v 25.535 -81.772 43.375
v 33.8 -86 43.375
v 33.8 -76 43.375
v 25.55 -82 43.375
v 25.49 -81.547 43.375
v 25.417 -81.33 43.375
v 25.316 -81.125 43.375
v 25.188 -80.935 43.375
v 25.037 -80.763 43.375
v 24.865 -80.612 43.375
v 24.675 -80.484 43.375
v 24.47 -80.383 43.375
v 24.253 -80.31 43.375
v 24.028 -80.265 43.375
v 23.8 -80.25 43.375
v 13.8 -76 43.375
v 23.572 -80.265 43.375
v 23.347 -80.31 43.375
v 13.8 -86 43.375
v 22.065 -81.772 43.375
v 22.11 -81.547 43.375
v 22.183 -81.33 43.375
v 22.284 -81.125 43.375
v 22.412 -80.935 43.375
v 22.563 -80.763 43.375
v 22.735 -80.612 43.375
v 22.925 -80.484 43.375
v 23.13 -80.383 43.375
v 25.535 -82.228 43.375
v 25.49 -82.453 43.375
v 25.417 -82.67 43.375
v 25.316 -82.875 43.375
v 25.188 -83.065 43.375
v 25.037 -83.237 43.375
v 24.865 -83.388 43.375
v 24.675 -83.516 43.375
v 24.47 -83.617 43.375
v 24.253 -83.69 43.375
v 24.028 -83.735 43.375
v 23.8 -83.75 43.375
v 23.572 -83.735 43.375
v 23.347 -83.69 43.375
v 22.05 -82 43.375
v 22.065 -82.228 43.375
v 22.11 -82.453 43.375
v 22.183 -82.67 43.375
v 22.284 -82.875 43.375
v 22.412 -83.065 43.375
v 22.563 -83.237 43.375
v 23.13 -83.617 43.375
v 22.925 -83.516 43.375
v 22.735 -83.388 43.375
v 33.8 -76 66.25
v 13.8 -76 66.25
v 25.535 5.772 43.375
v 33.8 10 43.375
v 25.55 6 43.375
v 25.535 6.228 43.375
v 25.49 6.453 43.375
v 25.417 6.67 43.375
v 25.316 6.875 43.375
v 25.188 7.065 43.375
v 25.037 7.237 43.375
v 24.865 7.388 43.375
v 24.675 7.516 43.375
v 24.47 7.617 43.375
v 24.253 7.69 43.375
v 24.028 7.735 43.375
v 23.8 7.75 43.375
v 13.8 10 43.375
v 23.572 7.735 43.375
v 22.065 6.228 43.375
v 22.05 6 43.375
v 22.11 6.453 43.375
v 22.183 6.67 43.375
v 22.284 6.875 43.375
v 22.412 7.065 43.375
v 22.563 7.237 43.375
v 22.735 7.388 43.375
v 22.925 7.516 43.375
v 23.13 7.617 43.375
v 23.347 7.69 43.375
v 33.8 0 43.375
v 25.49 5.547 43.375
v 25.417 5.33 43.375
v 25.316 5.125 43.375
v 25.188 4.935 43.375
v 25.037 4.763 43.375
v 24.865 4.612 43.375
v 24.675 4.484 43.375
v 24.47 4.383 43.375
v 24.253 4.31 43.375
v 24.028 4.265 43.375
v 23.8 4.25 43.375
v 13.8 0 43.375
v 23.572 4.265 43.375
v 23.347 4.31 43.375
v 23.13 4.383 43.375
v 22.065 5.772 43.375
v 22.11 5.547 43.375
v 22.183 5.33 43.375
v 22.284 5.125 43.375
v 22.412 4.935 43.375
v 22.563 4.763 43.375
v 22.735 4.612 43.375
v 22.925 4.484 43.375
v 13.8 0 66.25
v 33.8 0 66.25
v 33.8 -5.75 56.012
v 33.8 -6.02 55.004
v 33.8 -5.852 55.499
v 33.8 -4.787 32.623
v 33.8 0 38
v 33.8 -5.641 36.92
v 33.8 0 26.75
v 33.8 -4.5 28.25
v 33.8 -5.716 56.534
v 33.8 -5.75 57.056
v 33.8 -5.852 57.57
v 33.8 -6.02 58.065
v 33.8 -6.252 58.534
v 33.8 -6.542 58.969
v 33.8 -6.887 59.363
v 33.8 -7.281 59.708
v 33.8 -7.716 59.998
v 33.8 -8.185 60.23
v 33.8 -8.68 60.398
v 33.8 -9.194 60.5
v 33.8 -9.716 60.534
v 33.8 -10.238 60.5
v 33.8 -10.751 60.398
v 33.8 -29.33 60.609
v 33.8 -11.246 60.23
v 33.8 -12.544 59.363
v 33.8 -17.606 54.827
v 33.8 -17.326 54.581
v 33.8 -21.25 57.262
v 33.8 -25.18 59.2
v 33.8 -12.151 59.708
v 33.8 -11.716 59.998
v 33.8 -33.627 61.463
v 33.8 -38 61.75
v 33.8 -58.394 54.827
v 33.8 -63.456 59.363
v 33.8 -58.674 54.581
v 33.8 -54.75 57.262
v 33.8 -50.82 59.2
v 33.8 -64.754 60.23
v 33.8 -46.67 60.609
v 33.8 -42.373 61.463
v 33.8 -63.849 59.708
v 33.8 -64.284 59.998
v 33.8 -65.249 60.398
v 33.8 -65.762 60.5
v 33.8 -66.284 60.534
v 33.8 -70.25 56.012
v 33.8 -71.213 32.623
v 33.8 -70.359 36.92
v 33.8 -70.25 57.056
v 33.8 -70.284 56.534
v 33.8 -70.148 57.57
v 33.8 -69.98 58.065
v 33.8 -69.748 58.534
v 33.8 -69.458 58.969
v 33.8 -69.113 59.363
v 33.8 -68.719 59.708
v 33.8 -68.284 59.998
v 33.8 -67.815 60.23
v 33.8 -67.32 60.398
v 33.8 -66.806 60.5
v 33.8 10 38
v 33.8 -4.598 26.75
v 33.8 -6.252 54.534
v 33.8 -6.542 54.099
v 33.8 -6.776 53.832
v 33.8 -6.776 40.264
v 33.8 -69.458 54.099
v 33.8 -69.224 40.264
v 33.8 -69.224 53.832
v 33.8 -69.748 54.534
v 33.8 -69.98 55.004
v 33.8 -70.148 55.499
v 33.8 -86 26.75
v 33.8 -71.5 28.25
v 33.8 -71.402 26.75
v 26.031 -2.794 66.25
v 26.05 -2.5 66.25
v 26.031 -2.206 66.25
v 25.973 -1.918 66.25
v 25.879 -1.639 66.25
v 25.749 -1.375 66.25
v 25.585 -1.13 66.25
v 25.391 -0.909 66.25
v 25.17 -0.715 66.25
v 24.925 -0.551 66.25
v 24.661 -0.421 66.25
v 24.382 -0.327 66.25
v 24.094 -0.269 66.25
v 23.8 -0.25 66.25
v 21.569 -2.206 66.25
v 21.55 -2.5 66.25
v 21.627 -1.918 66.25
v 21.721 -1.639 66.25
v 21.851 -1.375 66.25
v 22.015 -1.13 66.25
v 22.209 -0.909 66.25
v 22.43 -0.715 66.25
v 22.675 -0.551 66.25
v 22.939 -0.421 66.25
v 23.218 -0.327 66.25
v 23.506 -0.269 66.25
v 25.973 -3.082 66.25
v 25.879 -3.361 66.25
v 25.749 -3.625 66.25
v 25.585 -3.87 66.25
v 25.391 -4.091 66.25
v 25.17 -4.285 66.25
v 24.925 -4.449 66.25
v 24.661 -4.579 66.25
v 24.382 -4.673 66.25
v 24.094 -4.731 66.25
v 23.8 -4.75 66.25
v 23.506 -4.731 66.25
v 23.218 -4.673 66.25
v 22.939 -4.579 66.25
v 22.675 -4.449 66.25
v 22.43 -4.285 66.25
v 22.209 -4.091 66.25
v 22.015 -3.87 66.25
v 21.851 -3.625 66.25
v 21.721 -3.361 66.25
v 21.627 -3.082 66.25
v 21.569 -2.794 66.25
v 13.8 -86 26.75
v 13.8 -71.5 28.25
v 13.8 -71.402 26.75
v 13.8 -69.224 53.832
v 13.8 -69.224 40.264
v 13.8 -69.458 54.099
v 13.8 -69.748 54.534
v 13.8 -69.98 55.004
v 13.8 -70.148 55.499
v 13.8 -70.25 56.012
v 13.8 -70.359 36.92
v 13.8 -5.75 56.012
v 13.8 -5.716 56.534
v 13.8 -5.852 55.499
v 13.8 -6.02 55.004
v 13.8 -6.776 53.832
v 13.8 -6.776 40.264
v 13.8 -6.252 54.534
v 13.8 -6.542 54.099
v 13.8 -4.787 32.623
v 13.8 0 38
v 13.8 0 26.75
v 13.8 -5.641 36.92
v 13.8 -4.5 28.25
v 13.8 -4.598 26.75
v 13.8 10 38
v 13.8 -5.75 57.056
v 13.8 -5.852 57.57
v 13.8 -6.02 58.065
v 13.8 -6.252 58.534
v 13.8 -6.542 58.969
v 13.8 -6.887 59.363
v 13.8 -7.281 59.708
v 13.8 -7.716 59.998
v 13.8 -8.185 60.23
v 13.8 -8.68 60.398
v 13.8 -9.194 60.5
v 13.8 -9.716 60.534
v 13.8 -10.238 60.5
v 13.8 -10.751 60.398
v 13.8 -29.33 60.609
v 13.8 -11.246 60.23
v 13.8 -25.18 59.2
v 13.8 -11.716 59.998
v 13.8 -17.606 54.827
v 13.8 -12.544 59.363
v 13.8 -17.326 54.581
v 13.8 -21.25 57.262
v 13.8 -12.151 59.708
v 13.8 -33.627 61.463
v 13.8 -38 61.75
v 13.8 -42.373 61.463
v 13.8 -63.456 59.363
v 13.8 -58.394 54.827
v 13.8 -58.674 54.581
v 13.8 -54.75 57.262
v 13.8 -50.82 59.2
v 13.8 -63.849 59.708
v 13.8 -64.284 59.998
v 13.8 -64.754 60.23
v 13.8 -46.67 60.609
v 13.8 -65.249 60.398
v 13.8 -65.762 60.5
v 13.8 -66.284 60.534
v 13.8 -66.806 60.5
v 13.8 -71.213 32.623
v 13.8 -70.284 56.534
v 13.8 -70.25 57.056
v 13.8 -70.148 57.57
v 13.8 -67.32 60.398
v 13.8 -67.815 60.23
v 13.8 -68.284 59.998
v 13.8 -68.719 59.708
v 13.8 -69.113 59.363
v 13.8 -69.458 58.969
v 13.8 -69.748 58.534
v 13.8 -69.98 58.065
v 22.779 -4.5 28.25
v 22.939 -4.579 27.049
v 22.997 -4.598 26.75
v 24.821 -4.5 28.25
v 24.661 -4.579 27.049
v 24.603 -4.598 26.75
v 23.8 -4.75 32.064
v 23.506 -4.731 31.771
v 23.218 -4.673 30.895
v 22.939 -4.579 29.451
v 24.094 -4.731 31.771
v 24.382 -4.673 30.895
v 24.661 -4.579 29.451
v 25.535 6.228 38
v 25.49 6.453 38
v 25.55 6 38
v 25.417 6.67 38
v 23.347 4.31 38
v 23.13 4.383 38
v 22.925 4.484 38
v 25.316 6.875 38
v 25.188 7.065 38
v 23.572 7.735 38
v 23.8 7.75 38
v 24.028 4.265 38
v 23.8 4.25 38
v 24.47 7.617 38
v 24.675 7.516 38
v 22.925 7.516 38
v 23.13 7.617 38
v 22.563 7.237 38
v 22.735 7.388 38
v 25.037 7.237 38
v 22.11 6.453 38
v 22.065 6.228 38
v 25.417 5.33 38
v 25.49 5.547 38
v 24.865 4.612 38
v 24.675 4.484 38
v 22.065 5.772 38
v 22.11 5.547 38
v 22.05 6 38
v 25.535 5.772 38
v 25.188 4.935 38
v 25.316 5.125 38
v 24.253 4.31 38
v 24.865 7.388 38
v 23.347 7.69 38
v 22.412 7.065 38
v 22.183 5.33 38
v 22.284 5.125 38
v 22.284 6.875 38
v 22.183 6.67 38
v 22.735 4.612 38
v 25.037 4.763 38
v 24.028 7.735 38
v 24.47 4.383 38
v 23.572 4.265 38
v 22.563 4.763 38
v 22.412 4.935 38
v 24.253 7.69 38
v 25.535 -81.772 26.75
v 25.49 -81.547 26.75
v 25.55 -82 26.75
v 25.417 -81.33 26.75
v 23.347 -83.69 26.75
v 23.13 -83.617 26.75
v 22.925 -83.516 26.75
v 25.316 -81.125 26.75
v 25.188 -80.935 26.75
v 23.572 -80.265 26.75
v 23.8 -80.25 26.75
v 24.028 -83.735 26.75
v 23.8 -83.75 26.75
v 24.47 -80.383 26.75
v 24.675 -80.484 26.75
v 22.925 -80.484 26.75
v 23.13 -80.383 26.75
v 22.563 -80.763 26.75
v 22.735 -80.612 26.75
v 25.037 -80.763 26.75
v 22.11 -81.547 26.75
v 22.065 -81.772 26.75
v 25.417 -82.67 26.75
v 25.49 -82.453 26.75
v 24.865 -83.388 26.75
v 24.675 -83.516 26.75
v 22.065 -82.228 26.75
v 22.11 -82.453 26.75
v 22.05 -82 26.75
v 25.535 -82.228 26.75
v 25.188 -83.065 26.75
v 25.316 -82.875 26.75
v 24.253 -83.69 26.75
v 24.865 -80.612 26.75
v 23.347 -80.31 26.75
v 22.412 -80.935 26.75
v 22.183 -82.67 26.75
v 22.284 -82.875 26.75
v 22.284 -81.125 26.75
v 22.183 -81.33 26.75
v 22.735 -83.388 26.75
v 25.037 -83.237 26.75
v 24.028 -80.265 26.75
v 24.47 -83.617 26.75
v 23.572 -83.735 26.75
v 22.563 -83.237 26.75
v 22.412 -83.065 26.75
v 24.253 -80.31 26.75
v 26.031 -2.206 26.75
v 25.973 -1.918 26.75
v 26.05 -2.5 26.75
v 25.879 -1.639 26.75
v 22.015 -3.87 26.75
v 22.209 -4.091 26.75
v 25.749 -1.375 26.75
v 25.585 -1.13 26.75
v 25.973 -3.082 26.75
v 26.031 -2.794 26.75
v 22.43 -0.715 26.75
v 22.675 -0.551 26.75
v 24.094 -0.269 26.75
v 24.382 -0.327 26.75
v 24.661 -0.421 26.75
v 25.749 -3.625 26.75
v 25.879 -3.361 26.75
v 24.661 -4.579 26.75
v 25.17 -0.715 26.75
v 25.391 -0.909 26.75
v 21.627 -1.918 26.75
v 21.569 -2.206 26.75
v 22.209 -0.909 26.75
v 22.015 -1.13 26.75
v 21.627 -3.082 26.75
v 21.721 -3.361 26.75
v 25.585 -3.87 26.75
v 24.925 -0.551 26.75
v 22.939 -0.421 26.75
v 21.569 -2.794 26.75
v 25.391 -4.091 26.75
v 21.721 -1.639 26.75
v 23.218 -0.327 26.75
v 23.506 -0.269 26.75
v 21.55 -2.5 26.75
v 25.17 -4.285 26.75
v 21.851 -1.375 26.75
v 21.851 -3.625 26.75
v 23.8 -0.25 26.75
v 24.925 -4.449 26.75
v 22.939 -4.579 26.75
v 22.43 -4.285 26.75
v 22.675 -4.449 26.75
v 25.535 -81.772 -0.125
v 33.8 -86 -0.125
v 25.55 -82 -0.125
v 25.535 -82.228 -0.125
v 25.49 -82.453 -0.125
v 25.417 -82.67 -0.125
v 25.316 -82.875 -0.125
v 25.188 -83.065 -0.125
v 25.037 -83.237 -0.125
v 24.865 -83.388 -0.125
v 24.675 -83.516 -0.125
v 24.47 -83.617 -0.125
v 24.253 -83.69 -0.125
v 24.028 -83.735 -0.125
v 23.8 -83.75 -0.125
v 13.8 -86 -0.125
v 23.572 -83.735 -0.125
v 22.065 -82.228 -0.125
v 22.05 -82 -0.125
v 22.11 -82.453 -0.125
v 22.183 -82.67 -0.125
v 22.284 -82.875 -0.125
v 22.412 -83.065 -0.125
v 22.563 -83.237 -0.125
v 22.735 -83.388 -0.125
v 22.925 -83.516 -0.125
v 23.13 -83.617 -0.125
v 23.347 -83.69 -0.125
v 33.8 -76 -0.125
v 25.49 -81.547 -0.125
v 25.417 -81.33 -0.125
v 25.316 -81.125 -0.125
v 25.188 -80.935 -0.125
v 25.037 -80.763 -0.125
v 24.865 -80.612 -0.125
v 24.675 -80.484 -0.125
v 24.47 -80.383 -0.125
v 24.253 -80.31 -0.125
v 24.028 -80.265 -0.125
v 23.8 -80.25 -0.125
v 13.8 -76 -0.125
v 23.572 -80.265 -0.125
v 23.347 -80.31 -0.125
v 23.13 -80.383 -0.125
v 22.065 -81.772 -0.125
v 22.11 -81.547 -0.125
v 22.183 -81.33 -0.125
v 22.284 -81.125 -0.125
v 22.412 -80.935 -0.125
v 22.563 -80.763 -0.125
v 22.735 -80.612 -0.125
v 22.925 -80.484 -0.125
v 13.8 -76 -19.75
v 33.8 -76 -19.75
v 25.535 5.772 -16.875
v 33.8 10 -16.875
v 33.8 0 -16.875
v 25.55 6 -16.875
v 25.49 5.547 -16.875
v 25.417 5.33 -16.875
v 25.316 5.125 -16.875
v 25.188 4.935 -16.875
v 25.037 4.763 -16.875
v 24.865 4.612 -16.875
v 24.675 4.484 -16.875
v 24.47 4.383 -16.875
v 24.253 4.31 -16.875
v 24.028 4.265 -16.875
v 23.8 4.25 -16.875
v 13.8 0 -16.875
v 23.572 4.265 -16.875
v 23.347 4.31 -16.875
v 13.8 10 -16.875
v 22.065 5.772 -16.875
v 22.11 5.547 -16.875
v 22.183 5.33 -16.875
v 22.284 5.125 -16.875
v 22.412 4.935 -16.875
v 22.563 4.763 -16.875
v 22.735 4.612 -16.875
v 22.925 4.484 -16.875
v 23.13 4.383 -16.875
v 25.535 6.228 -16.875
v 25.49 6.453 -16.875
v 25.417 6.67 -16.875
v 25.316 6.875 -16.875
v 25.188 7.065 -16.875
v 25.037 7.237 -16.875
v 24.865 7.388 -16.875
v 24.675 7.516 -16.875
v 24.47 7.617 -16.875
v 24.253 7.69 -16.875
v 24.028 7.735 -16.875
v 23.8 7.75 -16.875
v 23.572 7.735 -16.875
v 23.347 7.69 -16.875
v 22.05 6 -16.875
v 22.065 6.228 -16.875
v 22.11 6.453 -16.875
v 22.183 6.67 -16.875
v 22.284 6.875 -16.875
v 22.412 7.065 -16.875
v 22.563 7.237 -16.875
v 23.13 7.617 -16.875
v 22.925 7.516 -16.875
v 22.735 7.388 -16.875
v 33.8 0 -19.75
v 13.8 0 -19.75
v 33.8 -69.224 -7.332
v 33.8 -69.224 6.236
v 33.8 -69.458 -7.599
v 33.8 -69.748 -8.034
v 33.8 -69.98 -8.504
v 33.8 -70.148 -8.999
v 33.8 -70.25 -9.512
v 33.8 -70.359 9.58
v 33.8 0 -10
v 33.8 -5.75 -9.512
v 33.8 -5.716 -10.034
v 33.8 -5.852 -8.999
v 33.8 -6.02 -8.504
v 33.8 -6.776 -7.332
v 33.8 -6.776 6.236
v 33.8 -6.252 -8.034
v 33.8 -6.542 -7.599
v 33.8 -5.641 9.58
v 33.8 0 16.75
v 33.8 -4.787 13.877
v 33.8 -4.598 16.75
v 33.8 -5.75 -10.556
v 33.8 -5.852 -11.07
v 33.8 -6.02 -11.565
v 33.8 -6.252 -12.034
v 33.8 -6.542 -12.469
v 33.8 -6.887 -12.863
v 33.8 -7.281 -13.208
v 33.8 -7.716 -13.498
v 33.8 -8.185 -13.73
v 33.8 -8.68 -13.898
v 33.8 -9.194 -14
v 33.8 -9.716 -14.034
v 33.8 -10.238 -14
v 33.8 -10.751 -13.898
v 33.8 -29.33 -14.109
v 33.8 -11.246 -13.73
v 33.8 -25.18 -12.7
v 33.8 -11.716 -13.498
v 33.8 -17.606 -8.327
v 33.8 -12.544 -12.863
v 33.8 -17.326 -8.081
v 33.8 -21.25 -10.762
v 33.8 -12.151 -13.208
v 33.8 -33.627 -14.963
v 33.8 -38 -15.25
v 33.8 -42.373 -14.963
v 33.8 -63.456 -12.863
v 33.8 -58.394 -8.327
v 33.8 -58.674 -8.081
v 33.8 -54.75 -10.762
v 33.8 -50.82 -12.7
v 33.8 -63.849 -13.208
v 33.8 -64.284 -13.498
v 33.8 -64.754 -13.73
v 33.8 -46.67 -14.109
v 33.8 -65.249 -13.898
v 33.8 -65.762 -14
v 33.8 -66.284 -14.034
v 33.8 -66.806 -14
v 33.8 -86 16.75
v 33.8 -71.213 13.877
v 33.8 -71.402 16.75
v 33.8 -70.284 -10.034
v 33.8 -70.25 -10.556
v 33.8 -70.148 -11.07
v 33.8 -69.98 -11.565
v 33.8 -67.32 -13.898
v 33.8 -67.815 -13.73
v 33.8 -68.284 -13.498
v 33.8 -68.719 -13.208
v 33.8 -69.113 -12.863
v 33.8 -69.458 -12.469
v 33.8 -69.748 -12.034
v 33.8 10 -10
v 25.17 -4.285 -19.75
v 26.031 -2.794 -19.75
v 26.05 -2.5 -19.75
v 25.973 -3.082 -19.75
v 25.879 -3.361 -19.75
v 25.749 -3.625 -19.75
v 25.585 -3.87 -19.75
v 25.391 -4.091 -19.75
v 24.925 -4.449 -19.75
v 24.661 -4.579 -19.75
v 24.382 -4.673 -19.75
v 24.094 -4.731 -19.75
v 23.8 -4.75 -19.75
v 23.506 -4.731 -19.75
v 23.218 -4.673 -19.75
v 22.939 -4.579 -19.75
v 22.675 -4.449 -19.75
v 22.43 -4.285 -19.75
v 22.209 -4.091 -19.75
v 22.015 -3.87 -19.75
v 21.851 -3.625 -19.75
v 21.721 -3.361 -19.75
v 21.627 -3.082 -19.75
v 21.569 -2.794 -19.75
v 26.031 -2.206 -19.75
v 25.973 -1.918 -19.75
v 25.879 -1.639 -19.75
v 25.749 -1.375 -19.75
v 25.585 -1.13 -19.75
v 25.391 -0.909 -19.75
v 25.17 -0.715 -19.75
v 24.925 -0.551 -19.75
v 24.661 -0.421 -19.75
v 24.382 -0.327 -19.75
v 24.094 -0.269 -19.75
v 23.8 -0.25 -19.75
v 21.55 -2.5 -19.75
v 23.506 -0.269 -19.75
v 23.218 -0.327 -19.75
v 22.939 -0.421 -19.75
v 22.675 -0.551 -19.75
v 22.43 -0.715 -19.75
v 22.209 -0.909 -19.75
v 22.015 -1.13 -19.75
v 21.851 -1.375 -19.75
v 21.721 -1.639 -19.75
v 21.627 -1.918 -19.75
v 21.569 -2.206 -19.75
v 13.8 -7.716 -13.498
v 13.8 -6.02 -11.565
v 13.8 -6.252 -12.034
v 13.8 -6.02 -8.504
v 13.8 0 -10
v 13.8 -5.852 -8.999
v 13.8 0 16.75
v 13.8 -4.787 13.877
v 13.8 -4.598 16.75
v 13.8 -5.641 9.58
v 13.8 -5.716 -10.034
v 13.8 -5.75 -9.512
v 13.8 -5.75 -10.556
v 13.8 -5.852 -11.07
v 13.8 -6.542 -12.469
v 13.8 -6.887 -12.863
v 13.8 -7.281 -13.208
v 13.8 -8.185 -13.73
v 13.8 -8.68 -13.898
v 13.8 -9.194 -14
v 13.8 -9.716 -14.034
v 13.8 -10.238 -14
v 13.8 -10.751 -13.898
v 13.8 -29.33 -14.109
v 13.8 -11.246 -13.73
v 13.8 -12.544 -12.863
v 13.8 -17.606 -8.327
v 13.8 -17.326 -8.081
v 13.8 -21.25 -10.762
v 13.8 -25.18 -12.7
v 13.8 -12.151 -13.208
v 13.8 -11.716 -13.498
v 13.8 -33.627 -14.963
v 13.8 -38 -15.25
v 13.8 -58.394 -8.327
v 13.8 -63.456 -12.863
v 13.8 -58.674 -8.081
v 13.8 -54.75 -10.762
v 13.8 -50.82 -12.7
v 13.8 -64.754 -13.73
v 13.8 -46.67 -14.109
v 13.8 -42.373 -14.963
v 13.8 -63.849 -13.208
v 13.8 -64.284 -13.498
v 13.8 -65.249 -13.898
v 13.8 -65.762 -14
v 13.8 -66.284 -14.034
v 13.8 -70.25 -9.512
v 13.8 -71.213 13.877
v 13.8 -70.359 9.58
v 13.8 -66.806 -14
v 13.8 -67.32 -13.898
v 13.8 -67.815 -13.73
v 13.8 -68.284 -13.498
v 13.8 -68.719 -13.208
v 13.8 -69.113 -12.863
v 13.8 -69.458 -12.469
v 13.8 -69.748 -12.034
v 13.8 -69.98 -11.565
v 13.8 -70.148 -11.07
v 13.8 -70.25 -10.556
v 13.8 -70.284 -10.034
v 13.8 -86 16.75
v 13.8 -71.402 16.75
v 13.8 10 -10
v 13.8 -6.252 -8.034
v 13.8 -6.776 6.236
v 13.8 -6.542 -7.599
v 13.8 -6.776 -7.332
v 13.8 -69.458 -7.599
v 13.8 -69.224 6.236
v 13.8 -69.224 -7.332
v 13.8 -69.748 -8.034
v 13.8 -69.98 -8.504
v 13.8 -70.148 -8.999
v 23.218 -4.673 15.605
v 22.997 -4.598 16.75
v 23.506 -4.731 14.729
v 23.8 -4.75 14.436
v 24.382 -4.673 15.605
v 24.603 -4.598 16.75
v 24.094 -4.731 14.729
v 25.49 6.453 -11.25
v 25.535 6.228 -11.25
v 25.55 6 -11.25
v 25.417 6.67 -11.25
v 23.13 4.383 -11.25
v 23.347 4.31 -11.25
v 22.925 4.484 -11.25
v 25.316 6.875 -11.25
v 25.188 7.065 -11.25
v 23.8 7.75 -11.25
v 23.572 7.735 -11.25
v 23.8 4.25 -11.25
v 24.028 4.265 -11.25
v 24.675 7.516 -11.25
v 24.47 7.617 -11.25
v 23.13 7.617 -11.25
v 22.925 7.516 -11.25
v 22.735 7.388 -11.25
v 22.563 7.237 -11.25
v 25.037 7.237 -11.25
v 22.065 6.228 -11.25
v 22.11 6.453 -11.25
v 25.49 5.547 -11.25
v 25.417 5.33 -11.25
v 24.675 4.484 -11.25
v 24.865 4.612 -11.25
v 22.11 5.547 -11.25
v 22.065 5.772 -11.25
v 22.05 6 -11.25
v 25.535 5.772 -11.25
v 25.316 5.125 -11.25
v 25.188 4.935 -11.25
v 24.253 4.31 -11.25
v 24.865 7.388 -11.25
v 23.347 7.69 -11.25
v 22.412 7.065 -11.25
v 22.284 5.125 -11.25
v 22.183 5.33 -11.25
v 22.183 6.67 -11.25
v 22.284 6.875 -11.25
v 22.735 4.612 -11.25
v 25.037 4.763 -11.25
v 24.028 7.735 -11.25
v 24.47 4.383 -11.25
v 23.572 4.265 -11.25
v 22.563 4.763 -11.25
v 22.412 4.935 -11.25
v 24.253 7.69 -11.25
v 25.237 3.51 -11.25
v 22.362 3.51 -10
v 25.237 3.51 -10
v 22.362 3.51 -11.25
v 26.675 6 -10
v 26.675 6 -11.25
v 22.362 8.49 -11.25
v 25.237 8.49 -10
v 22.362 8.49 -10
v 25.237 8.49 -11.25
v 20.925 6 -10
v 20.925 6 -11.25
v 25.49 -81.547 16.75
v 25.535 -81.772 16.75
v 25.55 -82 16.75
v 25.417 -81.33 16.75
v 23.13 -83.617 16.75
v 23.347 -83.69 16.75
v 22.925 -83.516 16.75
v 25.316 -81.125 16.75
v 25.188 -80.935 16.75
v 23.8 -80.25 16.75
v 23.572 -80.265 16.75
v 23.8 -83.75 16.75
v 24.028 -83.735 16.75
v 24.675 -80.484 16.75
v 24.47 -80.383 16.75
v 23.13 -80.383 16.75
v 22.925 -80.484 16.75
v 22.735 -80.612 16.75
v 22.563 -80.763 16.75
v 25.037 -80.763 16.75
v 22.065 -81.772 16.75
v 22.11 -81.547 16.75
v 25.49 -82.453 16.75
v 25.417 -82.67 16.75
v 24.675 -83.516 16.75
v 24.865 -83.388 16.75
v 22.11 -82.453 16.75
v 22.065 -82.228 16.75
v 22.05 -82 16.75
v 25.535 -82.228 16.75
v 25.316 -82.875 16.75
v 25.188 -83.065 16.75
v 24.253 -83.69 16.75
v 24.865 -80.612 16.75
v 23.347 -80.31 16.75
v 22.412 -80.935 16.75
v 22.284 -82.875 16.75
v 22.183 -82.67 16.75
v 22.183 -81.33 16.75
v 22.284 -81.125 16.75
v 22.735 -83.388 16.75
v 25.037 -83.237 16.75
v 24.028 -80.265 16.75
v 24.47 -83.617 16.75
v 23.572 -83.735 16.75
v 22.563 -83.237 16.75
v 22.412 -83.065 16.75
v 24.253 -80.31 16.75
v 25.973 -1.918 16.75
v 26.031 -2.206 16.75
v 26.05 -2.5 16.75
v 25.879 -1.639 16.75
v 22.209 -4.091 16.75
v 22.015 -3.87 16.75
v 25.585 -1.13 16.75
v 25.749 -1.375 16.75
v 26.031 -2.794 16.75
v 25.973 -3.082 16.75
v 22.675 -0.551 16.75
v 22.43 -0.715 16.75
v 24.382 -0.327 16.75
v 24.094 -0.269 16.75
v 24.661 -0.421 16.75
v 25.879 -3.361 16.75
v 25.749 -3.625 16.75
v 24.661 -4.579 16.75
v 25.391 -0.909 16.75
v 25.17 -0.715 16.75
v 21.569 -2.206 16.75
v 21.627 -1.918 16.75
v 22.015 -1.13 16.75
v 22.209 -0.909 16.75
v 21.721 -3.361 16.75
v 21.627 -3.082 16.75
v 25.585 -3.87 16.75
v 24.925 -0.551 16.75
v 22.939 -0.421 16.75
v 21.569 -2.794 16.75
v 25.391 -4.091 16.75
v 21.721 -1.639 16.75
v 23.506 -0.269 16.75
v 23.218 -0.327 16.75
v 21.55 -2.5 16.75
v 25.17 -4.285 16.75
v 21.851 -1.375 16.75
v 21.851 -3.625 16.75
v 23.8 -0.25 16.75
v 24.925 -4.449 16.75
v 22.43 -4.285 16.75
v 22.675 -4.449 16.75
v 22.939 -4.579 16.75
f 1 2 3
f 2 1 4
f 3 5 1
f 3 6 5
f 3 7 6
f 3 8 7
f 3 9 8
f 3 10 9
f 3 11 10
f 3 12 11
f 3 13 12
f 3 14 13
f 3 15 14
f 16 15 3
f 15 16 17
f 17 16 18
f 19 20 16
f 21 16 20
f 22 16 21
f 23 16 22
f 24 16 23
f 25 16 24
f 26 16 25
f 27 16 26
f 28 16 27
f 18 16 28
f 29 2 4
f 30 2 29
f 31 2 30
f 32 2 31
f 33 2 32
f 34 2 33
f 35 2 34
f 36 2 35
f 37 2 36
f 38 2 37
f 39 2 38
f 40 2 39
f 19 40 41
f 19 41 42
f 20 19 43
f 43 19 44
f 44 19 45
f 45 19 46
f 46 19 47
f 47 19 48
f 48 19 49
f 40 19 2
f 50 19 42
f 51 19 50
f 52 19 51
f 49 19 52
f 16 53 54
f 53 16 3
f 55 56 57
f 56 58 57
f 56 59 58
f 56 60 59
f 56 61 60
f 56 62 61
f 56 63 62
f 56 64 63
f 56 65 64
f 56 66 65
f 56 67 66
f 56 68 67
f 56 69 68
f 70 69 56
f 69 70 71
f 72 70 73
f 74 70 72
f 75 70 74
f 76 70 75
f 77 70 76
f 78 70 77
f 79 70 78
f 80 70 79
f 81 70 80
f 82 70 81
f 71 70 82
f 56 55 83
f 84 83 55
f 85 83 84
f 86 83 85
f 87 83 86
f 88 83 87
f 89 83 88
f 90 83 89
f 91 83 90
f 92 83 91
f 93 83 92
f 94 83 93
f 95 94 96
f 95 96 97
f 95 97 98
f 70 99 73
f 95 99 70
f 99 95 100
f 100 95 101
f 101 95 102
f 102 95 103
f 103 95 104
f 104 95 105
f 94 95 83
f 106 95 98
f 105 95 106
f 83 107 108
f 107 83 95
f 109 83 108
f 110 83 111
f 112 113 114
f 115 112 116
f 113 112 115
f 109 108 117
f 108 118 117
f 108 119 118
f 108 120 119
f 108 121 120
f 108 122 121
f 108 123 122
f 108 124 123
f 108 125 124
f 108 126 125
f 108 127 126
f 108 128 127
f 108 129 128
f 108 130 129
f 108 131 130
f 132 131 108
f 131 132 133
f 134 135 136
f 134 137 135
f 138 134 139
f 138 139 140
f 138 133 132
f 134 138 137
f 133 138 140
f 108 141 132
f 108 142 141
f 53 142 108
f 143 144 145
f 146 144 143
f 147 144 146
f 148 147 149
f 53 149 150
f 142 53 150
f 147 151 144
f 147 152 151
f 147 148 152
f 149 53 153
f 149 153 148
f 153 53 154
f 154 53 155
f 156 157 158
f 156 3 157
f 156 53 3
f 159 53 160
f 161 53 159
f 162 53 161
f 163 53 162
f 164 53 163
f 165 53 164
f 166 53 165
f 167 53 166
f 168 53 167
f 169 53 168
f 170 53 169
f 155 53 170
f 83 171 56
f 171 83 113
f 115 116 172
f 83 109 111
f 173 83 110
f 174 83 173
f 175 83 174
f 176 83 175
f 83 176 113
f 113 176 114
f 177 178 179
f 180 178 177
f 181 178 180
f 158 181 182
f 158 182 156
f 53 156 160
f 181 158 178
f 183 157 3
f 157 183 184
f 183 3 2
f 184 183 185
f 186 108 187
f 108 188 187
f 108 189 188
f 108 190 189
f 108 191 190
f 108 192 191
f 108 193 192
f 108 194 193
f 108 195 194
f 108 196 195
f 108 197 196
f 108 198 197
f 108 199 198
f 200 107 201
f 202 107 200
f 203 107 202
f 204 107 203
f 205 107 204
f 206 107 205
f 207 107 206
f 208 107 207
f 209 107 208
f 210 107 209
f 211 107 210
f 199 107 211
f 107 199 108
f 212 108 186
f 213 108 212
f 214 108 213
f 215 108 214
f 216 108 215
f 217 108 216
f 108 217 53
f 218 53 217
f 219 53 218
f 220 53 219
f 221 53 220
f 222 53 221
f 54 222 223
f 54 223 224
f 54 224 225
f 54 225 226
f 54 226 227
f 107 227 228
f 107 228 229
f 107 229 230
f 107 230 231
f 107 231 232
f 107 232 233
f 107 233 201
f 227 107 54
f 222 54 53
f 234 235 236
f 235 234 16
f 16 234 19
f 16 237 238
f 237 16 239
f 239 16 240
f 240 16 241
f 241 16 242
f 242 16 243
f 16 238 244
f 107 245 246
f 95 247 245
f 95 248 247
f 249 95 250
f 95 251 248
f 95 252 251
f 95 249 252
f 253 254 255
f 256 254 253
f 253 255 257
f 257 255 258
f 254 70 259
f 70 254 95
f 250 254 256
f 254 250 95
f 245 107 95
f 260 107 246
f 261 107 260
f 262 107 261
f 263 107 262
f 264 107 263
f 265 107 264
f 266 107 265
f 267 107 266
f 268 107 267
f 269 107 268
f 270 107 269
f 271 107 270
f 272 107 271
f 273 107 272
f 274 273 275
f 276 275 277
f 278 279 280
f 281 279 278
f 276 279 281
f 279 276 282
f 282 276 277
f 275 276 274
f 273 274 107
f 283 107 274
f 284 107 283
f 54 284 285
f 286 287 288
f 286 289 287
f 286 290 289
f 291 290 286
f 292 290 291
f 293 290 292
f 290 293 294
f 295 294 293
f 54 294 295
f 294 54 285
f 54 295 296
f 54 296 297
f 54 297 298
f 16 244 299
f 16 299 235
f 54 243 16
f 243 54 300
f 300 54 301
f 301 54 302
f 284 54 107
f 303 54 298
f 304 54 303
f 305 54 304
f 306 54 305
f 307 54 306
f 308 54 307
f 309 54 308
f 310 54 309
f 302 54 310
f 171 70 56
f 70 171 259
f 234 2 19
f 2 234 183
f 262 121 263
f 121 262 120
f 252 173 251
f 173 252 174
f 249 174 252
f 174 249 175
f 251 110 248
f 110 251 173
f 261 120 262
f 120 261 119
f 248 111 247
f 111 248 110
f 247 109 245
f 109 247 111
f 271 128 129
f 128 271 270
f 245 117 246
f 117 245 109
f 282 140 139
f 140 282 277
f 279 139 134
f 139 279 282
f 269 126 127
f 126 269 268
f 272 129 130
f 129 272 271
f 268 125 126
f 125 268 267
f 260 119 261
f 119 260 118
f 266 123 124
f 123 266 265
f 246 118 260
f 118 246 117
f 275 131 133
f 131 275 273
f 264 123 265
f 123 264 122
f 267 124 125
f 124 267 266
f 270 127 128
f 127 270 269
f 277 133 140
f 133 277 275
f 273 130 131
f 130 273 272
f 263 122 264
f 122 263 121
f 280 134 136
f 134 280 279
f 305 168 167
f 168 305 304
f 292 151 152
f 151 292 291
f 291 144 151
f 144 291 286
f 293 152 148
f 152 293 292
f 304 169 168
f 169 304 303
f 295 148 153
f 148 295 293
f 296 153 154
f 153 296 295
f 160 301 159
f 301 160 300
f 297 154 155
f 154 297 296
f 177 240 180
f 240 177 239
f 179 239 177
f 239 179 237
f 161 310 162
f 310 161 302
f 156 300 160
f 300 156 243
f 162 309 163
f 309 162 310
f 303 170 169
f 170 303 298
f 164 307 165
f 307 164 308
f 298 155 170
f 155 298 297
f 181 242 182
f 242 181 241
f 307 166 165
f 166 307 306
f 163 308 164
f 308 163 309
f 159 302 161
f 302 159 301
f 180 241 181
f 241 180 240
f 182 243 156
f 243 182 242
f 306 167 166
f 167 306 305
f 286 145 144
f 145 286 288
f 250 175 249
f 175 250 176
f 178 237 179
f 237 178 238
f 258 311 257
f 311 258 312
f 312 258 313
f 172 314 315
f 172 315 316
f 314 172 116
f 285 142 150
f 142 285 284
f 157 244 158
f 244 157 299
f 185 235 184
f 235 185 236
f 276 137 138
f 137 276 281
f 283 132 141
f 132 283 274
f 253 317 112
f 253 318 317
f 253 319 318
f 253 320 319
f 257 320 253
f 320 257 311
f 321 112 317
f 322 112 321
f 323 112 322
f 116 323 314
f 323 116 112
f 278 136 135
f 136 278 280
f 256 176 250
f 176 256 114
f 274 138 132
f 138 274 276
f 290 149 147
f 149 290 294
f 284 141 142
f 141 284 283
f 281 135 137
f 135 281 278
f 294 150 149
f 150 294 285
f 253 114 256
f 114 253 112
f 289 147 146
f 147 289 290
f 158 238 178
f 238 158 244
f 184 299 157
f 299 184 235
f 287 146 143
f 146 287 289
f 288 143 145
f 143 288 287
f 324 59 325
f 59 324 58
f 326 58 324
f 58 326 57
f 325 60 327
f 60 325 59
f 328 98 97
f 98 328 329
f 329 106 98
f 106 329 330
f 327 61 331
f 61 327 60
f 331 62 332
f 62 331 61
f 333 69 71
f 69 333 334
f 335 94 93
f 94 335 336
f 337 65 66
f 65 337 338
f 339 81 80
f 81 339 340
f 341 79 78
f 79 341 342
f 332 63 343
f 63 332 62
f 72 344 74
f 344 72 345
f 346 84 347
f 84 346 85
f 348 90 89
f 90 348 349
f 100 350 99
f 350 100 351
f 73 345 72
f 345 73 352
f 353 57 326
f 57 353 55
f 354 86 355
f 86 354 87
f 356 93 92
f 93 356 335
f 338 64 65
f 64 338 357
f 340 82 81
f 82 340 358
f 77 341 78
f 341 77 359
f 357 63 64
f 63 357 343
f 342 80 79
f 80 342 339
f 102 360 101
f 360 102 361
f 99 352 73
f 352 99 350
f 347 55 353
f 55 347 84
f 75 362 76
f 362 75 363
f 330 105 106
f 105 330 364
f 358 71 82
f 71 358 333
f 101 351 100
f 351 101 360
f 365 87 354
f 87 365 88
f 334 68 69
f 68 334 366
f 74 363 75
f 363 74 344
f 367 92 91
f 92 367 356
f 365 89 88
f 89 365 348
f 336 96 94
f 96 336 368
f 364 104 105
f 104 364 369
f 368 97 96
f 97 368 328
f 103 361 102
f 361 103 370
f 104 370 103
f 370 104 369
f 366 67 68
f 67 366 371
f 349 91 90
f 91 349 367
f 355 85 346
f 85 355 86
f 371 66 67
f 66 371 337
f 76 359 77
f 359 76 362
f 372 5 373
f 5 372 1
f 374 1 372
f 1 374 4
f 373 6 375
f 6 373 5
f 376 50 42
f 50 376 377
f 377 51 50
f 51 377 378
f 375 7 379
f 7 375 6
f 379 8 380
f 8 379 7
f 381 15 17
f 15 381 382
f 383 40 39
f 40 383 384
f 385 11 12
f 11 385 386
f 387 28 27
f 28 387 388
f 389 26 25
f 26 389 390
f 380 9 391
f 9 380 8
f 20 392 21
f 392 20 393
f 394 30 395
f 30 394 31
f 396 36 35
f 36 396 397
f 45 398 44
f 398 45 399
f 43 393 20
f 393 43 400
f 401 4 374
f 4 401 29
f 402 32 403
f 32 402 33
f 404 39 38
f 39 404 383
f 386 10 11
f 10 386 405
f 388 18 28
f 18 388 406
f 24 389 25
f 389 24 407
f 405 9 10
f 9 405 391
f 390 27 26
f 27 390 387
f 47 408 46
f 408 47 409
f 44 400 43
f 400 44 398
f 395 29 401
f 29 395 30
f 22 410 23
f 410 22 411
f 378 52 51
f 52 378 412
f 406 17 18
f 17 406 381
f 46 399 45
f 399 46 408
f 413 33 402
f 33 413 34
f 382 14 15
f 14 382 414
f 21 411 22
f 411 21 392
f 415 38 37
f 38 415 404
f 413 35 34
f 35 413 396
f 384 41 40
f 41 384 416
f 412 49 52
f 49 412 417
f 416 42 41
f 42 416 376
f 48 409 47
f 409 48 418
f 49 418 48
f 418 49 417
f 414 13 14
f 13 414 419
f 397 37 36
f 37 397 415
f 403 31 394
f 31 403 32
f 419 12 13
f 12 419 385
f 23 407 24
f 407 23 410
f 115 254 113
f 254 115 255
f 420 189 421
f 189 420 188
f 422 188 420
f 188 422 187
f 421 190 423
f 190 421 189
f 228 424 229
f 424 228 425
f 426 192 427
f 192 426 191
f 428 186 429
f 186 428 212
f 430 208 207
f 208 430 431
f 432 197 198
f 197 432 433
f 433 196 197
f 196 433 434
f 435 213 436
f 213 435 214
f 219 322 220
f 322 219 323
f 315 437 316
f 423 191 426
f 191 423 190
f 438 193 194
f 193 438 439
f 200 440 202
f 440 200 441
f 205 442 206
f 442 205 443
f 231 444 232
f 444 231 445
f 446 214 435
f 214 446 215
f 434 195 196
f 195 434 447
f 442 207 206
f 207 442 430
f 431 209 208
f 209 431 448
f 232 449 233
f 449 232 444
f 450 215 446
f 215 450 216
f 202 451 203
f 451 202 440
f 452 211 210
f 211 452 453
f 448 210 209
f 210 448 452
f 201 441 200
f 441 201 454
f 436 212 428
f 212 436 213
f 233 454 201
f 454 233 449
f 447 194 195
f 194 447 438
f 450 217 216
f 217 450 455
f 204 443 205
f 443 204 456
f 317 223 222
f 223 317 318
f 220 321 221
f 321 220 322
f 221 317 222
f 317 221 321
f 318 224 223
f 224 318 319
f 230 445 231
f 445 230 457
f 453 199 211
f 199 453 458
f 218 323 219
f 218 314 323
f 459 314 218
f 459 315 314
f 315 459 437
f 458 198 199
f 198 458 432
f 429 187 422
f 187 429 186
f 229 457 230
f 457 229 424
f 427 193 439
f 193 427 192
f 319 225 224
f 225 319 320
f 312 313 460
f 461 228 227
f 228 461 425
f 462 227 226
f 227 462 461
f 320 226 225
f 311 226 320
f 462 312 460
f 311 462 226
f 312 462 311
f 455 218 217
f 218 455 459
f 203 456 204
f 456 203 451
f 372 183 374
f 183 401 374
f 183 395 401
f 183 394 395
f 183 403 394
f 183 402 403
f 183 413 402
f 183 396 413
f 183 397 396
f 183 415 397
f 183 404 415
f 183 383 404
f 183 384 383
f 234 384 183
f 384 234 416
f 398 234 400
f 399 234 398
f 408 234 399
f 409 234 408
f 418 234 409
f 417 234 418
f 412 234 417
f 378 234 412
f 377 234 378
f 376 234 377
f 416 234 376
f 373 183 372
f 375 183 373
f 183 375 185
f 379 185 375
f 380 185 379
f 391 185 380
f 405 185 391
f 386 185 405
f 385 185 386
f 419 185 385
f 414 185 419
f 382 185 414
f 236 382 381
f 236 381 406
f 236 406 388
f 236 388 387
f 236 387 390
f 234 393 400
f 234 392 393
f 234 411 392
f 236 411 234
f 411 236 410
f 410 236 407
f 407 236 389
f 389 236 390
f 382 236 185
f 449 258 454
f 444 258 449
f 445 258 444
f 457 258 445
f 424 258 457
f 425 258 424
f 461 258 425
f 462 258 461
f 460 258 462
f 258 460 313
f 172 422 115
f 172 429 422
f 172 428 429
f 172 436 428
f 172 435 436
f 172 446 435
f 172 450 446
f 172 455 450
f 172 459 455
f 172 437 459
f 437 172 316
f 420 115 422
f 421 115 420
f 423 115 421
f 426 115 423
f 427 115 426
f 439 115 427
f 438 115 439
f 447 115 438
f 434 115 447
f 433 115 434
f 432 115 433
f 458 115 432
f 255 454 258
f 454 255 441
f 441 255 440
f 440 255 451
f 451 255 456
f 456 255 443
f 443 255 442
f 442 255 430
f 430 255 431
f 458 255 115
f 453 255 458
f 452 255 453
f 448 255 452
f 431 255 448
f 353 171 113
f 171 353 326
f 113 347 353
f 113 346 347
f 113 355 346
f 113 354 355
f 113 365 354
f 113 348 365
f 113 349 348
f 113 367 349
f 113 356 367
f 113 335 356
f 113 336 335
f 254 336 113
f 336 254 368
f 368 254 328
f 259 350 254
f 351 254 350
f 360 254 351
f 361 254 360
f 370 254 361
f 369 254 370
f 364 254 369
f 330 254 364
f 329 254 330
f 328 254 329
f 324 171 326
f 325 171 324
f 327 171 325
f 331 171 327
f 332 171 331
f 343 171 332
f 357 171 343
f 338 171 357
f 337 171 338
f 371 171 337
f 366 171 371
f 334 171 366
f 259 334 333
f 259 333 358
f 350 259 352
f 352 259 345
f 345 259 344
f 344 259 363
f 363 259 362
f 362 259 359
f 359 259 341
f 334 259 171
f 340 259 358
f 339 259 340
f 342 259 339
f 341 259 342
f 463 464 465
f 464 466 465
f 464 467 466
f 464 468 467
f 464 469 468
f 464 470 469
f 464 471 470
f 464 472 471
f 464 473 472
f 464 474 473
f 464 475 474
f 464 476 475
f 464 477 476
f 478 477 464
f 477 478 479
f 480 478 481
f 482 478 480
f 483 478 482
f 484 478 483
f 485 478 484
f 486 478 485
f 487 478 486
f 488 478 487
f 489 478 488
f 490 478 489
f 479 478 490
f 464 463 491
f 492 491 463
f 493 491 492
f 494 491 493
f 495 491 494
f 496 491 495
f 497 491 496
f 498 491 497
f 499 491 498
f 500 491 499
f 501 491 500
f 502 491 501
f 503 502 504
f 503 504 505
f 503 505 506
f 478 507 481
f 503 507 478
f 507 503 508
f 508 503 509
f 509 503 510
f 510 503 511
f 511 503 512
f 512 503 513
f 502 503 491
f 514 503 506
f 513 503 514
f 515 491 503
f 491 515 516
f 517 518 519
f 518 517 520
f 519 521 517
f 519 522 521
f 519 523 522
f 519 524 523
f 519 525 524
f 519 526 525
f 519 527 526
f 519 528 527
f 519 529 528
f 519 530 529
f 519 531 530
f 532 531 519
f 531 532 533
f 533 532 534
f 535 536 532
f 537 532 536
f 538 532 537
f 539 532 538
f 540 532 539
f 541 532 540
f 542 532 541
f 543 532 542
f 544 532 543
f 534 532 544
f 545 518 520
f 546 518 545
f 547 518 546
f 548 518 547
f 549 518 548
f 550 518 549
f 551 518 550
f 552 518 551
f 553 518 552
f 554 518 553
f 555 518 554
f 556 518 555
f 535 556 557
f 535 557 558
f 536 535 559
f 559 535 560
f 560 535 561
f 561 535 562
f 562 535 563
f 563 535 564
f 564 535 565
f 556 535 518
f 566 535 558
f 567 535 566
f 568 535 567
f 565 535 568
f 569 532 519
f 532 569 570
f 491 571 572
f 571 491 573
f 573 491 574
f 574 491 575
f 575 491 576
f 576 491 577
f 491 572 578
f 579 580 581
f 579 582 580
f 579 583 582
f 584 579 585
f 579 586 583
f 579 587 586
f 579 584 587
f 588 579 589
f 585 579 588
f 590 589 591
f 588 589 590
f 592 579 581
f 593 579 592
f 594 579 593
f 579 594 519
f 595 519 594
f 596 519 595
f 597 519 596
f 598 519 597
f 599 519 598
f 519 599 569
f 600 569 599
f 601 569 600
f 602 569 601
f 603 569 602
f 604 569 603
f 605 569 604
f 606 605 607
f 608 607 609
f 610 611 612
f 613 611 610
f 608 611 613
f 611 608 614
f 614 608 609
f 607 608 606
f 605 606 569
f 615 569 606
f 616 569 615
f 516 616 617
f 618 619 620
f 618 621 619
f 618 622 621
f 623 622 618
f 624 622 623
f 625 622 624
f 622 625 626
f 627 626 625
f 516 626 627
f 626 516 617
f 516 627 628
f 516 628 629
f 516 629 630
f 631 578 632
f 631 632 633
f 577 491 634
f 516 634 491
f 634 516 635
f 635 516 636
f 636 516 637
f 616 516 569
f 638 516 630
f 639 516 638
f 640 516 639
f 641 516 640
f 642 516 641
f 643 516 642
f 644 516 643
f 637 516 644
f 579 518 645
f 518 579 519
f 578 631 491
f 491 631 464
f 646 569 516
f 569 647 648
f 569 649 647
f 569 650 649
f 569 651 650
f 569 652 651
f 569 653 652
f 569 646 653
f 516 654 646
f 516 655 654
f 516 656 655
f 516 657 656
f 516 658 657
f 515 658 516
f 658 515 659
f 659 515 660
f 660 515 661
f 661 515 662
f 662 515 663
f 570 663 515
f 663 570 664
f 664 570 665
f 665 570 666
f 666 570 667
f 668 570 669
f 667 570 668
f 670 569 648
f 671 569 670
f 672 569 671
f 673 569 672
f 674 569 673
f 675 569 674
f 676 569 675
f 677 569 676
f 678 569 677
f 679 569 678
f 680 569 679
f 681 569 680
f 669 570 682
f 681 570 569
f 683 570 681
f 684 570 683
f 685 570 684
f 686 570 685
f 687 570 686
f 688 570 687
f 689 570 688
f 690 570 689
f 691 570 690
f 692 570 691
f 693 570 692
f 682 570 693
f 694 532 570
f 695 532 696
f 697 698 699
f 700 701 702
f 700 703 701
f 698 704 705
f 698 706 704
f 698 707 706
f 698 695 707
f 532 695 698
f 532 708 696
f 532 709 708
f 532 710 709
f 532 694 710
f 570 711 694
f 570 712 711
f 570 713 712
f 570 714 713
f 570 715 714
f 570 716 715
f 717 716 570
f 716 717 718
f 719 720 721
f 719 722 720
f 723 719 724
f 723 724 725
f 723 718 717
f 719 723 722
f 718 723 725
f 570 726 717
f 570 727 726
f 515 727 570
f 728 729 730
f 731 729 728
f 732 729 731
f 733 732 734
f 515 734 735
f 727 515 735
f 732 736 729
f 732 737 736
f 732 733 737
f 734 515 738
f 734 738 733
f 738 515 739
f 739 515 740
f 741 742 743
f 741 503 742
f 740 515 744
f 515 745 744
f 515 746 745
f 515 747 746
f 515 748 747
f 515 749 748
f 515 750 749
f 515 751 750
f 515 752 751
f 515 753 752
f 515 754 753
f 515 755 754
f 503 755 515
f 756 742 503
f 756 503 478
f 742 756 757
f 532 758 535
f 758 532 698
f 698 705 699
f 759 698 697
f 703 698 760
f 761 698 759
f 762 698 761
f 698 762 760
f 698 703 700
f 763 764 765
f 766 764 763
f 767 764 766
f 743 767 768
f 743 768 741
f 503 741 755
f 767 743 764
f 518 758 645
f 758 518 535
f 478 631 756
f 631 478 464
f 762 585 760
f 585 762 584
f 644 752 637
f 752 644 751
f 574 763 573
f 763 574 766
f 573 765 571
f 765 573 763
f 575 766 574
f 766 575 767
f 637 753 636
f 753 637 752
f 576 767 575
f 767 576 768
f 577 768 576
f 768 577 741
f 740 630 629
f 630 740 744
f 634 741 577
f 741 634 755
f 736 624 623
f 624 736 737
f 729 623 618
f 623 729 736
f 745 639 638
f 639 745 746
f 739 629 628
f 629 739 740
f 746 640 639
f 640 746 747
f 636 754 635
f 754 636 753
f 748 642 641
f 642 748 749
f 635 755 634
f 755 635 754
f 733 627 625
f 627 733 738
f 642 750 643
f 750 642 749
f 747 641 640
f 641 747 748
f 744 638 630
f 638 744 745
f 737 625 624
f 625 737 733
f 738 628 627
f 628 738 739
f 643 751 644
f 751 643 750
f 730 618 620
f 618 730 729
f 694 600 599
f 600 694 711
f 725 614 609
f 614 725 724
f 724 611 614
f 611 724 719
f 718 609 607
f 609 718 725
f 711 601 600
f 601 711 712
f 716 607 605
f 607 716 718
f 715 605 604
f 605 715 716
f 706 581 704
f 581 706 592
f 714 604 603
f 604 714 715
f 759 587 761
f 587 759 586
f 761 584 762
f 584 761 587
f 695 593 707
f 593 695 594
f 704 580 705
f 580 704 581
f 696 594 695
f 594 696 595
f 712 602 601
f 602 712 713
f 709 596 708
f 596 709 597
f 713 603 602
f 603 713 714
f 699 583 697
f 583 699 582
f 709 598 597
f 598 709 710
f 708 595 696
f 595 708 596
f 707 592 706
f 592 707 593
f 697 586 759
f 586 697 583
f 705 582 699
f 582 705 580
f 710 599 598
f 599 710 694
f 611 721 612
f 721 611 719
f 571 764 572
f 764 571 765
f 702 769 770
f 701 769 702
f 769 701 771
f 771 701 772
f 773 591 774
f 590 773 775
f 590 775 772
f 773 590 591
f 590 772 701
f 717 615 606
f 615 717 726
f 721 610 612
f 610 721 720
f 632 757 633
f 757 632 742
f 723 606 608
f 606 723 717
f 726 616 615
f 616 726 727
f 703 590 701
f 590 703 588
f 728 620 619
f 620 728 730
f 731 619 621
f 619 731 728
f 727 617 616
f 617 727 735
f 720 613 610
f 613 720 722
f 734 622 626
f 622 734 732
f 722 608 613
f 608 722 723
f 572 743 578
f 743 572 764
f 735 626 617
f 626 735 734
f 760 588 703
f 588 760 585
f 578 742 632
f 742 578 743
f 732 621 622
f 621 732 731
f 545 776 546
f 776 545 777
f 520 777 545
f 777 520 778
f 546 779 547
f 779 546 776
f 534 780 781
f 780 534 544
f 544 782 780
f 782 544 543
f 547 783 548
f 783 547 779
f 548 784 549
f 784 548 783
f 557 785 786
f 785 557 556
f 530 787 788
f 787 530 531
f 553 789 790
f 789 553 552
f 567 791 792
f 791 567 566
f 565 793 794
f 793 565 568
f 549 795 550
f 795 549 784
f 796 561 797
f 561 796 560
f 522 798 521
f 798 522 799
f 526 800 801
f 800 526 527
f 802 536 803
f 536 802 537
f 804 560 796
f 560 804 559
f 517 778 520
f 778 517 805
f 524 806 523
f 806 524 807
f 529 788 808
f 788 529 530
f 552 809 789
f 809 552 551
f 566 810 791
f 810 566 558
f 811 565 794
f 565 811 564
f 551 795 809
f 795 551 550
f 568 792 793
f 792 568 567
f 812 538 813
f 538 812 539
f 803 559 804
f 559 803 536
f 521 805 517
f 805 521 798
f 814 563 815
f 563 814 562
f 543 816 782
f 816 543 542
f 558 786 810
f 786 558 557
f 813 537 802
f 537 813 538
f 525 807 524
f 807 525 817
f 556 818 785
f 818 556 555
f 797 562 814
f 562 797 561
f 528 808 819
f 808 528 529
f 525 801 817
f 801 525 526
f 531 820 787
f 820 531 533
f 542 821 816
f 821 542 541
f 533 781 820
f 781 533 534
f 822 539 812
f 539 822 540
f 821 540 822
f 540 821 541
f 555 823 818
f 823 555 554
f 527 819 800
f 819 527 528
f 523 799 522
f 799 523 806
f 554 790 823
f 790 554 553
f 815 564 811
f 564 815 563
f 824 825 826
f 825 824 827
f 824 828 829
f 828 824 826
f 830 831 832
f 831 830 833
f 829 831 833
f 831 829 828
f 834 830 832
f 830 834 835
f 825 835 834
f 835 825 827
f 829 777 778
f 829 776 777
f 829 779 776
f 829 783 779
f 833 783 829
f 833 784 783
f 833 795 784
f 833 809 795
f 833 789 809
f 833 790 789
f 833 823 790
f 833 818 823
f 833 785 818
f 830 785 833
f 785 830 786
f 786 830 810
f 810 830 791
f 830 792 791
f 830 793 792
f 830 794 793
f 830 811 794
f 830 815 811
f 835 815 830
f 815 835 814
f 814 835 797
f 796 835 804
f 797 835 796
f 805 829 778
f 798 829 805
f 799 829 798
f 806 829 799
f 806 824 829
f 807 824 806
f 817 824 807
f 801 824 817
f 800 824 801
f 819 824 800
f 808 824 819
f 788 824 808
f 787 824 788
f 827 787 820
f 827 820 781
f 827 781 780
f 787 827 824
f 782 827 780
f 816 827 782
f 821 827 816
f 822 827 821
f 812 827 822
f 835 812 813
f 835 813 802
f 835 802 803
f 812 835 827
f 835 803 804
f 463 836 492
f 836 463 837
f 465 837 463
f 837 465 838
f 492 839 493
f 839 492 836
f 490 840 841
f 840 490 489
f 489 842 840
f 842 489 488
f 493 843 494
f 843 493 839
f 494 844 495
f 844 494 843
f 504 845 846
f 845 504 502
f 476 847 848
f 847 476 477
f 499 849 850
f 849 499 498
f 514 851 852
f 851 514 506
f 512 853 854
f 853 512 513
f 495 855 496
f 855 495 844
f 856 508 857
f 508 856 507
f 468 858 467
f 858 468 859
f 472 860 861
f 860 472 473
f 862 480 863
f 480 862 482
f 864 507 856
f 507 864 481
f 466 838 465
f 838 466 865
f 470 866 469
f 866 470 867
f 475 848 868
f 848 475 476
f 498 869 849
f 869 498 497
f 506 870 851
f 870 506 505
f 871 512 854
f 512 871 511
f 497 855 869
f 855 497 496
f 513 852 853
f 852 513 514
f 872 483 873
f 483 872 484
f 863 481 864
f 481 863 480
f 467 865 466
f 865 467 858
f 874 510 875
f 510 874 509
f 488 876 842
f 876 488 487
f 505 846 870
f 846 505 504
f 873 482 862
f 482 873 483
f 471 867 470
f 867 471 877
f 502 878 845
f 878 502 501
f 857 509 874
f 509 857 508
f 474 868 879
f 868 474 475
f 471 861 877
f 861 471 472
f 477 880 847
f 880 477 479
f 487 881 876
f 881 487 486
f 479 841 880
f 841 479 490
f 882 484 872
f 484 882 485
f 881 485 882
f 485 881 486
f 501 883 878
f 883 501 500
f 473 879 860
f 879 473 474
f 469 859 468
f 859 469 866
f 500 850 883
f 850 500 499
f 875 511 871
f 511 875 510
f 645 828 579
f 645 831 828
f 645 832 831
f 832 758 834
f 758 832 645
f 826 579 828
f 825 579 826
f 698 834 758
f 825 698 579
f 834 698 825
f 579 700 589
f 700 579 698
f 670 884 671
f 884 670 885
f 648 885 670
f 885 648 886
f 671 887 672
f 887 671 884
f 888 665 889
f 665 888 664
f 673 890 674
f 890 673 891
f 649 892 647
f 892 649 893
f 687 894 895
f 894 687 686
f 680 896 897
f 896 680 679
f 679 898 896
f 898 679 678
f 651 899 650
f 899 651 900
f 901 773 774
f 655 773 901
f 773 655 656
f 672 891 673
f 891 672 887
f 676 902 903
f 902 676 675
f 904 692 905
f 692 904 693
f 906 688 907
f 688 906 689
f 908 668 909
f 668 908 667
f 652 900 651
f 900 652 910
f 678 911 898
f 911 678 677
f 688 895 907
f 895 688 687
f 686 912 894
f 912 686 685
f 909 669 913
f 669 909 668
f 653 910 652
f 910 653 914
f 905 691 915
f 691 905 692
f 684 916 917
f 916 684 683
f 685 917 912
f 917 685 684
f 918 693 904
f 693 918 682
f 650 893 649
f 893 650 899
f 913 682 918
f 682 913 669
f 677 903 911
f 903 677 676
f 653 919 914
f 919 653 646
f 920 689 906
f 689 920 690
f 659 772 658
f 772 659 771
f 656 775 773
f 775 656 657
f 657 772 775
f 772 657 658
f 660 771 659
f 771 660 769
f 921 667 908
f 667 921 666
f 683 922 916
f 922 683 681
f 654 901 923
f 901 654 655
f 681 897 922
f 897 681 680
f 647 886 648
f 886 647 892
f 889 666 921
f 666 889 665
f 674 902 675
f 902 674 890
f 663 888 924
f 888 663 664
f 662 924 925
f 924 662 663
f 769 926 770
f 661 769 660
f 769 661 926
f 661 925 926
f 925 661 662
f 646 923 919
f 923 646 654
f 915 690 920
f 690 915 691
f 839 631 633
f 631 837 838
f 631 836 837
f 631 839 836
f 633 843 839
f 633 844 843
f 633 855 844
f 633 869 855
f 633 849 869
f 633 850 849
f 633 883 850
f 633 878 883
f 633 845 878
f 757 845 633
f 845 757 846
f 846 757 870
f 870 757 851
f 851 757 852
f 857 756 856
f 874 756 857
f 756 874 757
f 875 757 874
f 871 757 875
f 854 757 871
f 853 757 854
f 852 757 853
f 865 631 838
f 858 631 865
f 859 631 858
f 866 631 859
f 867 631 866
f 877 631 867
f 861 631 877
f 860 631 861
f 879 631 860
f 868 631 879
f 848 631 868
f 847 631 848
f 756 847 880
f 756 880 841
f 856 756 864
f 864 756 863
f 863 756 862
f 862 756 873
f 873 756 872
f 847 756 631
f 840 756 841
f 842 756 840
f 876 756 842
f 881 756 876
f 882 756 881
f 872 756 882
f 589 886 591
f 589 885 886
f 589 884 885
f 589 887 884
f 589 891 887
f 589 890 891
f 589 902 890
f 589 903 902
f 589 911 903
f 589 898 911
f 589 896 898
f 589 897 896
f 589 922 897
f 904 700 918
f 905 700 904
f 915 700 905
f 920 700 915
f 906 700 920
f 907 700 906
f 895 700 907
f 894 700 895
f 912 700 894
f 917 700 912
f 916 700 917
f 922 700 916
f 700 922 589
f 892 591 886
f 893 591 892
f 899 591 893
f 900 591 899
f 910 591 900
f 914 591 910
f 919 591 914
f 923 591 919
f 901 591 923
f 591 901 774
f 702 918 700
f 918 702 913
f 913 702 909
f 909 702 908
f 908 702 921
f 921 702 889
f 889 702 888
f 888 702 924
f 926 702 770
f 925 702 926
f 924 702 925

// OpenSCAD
// file: BOSL2/std.scad
// Minimal BOSL2 compatibility shim for bundled gallery models.
// It implements only the helpers used by the imported OpenSCAD projects.

CENTER = [0, 0, 0];
BOTTOM = [0, 0, -1];
TOP = [0, 0, 1];
LEFT = [-1, 0, 0];
RIGHT = [1, 0, 0];
FRONT = [0, -1, 0];
BACK = [0, 1, 0];

module up(z=0) {
    translate([0, 0, z]) children();
}

module down(z=0) {
    translate([0, 0, -z]) children();
}

module attach(anchor=CENTER) {
    children();
}

module cuboid(size=[1, 1, 1], anchor=CENTER) {
    center = anchor == CENTER;
    translate(center ? [0, 0, 0] : [0, 0, size[2] / 2])
        cube(size, center=true);
    children();
}

module xcyl(h=1, r=1, anchor=CENTER) {
    center = anchor == CENTER;
    translate(center ? [0, 0, 0] : [h / 2, 0, 0])
        rotate([0, 90, 0])
            cylinder(h=h, r=r, center=true);
}
// main file
$fn=48;
include <BOSL2/std.scad>

piston_od=67;  //
piston_h=250;
pipe_od=8;
pipe_space=2.5;
hex_nut_d=5.75;  //7.75 for M4, 5.75 for M3
hex_nut_h=3;
shelf_h=10;
faceplate_h=3;
mount_d=3;
mount_l=20;
mount_h=piston_od + mount_d*2 + faceplate_h;
ossm_h=33.5;
ossm_bolt_d=3 + .5; //.5 for slop
ossm_bolt_offset=6;  //thought this would be 5, may be due to slop
ossm_pitclamp_offset=10; //to get out of the way of the pitclamp arm
first_ossm_screw=23.8;
show_piston=false;
show_ossm= false;
show_mount=true;
side_to_print=0; //1 for top, 2 for bottom, anything else for both. only effective is mount is the only thing showing

if (show_mount) {
    if (show_piston || show_ossm) {
        clamp();
        translate([50,0,0]) clamp();
    } else {
        if (side_to_print == 1 || side_to_print == 2) {
            clamp(print_side=side_to_print);
        } else {
            clamp(print_side=1);
            translate([0,0,-10]) clamp(print_side=2);
        }
    }
}

module clamp(print_side=0) {
    difference() {
        translate([first_ossm_screw-mount_l/2,-mount_h-shelf_h,ossm_h/2 - mount_h/2 + faceplate_h/2]) difference() {
            //main mounting block
            translate([0,0,ossm_pitclamp_offset]) cube([mount_l,mount_h+shelf_h*2,mount_h]);
            
            //fillets
            for (x = [0:1]) {
                    for (y = [-1:2:1]) {
                        translate([mount_l/2,(mount_h+shelf_h*2)*x,mount_h/2 + y* (ossm_h + ((y+1)/2)*ossm_pitclamp_offset) - ossm_pitclamp_offset/2]) {
                            translate([0,0,(y < 0 ? 1 : 0)*(x-1)*-ossm_h/2]) 
                                cuboid([mount_l+1,shelf_h*2,ossm_h/2+ossm_pitclamp_offset],rounding=shelf_h/2, edges="X");
                        }
                }
            }
        }

        //piston cutout
        translate([0,-mount_h/2,ossm_h/2 + faceplate_h/2 + ossm_pitclamp_offset]) piston();

        //ossm shelf cutout
        translate([first_ossm_screw,shelf_h,ossm_h/2])
            cuboid([mount_l+1,shelf_h*2,ossm_h],rounding=1);
        
            //mounting screwholes
        for (x = [0:1]) {
            translate([first_ossm_screw,-x*(mount_h+shelf_h) + shelf_h/2 +(x*-2)+1,ossm_h/2-mount_h/2 + ossm_pitclamp_offset]) { //magic +-1 to get to ossm_bolt_offset   
            cylinder(h=mount_h,d=ossm_bolt_d);
            

            //nuts n bolts
            translate([0,0,shelf_h])
                cylinder(h=hex_nut_h,d=hex_nut_d,$fn=6);

            translate([0,0,mount_h-shelf_h-hex_nut_h])
                cylinder(h=hex_nut_h,d=hex_nut_d,$fn=6);
            }
        }
        //all the way through
        translate([first_ossm_screw, -pipe_space, mount_h/2 - shelf_h]) cylinder(h=mount_h + shelf_h,d=ossm_bolt_d+1, center=true);  //ok, pipe_space is BS


        //erase top or bottom half for printing
        if (print_side == 1) {
            translate([first_ossm_screw-mount_l/2-1,-mount_h-shelf_h,ossm_h/2-mount_h/2])
        cube([mount_l+2,mount_h+shelf_h*2,mount_h/2 + ossm_pitclamp_offset]);
        }
        if (print_side == 2) {
            translate([first_ossm_screw-mount_l/2-1,-mount_h-shelf_h,ossm_h/2 + ossm_pitclamp_offset])
        cube([mount_l+2,mount_h+shelf_h*2,mount_h/2+faceplate_h/2]);
        }

        //ossm();
        
        //a simplified cutout for the OSSM
        translate([first_ossm_screw,shelf_h,ossm_h/2+faceplate_h]) cuboid([mount_l*2,shelf_h*2,ossm_h+faceplate_h],rounding=2);

    }

}
module ossm() {
    if (show_mount || show_piston) {
        color("cyan") translate([0,1,ossm_h]) import("../STL/ossm_cover_blank.stl");
    }
    color("blue") difference() {
        import("../STL/OSSM - Actuator - Body - Bottom.stl");
        
        //through holes
        color("red") {
            translate([first_ossm_screw,ossm_bolt_offset,-3]) { //-3 i dunno
                cylinder(h=ossm_h+6,d=ossm_bolt_d);
                translate([0,0,hex_nut_h*2]) {
                    cylinder(h=hex_nut_h,d=hex_nut_d,$fn=6);
                    translate([0,-shelf_h/2,hex_nut_h/2]) rotate([0,0,180]) cube([hex_nut_d,shelf_h,hex_nut_h], center=true);
                    color("transparent") translate([0,-hex_nut_d/2,hex_nut_h/2]) cube([hex_nut_d,ossm_bolt_offset,hex_nut_h], center=true);
                }
            }
        
            translate([first_ossm_screw+50,ossm_bolt_offset,-3]) {
                cylinder(h=ossm_h+6,d=ossm_bolt_d);
                translate([0,0,hex_nut_h*2]) {
                    cylinder(h= hex_nut_h,d= hex_nut_d,$fn=6);
                    translate([0,-shelf_h/2,hex_nut_h/2]) rotate([0,0,180]) cube([hex_nut_d,shelf_h,hex_nut_h], center=true);
                    color("transparent") translate([0,-hex_nut_d/2,hex_nut_h/2]) cube([hex_nut_d,ossm_bolt_offset,hex_nut_h], center=true);
                }
            }
        }
    }
}
if (show_ossm) {
    ossm();
}

if (show_piston) translate([piston_h/2,-piston_od/2 - mount_d*1.5,ossm_h/2 + ossm_pitclamp_offset+faceplate_h/2]) piston(); //magic *1.5

module piston() {
    rotate([0,90,0]) {
        color("grey")
        //main piston body
        cylinder(d=piston_od, h=piston_h, center=true);
        for (i = [0:3]) {
            
            rotate([0,0,90*i+45])  {

                //cutouts for sliding into place
                translate([piston_od/2-((i % 2 * 2 - 1) *-2 - (i % 2 ) *-4),(i % 2 * 2 - 1) *-7,first_ossm_screw])
                    rotate([0,0,(i % 2 * 2 - 1) * -45]) 
                        color("transparent") cube([pipe_od,piston_od/3,mount_l+1], center=true);  //(i % 2 * 2 - 1) * 1

                //channels for support poles on side of piston
                color("yellow") {
                    translate([0,piston_od/2 + pipe_od/2 + pipe_space,0]) {
                        cylinder(d=pipe_od, h=piston_h+1, center=true);
                        translate([0,-pipe_od/2,0]) cube([pipe_od,pipe_od,piston_h], center=true);
                    }
                }
            }
        }
    }
}

    
